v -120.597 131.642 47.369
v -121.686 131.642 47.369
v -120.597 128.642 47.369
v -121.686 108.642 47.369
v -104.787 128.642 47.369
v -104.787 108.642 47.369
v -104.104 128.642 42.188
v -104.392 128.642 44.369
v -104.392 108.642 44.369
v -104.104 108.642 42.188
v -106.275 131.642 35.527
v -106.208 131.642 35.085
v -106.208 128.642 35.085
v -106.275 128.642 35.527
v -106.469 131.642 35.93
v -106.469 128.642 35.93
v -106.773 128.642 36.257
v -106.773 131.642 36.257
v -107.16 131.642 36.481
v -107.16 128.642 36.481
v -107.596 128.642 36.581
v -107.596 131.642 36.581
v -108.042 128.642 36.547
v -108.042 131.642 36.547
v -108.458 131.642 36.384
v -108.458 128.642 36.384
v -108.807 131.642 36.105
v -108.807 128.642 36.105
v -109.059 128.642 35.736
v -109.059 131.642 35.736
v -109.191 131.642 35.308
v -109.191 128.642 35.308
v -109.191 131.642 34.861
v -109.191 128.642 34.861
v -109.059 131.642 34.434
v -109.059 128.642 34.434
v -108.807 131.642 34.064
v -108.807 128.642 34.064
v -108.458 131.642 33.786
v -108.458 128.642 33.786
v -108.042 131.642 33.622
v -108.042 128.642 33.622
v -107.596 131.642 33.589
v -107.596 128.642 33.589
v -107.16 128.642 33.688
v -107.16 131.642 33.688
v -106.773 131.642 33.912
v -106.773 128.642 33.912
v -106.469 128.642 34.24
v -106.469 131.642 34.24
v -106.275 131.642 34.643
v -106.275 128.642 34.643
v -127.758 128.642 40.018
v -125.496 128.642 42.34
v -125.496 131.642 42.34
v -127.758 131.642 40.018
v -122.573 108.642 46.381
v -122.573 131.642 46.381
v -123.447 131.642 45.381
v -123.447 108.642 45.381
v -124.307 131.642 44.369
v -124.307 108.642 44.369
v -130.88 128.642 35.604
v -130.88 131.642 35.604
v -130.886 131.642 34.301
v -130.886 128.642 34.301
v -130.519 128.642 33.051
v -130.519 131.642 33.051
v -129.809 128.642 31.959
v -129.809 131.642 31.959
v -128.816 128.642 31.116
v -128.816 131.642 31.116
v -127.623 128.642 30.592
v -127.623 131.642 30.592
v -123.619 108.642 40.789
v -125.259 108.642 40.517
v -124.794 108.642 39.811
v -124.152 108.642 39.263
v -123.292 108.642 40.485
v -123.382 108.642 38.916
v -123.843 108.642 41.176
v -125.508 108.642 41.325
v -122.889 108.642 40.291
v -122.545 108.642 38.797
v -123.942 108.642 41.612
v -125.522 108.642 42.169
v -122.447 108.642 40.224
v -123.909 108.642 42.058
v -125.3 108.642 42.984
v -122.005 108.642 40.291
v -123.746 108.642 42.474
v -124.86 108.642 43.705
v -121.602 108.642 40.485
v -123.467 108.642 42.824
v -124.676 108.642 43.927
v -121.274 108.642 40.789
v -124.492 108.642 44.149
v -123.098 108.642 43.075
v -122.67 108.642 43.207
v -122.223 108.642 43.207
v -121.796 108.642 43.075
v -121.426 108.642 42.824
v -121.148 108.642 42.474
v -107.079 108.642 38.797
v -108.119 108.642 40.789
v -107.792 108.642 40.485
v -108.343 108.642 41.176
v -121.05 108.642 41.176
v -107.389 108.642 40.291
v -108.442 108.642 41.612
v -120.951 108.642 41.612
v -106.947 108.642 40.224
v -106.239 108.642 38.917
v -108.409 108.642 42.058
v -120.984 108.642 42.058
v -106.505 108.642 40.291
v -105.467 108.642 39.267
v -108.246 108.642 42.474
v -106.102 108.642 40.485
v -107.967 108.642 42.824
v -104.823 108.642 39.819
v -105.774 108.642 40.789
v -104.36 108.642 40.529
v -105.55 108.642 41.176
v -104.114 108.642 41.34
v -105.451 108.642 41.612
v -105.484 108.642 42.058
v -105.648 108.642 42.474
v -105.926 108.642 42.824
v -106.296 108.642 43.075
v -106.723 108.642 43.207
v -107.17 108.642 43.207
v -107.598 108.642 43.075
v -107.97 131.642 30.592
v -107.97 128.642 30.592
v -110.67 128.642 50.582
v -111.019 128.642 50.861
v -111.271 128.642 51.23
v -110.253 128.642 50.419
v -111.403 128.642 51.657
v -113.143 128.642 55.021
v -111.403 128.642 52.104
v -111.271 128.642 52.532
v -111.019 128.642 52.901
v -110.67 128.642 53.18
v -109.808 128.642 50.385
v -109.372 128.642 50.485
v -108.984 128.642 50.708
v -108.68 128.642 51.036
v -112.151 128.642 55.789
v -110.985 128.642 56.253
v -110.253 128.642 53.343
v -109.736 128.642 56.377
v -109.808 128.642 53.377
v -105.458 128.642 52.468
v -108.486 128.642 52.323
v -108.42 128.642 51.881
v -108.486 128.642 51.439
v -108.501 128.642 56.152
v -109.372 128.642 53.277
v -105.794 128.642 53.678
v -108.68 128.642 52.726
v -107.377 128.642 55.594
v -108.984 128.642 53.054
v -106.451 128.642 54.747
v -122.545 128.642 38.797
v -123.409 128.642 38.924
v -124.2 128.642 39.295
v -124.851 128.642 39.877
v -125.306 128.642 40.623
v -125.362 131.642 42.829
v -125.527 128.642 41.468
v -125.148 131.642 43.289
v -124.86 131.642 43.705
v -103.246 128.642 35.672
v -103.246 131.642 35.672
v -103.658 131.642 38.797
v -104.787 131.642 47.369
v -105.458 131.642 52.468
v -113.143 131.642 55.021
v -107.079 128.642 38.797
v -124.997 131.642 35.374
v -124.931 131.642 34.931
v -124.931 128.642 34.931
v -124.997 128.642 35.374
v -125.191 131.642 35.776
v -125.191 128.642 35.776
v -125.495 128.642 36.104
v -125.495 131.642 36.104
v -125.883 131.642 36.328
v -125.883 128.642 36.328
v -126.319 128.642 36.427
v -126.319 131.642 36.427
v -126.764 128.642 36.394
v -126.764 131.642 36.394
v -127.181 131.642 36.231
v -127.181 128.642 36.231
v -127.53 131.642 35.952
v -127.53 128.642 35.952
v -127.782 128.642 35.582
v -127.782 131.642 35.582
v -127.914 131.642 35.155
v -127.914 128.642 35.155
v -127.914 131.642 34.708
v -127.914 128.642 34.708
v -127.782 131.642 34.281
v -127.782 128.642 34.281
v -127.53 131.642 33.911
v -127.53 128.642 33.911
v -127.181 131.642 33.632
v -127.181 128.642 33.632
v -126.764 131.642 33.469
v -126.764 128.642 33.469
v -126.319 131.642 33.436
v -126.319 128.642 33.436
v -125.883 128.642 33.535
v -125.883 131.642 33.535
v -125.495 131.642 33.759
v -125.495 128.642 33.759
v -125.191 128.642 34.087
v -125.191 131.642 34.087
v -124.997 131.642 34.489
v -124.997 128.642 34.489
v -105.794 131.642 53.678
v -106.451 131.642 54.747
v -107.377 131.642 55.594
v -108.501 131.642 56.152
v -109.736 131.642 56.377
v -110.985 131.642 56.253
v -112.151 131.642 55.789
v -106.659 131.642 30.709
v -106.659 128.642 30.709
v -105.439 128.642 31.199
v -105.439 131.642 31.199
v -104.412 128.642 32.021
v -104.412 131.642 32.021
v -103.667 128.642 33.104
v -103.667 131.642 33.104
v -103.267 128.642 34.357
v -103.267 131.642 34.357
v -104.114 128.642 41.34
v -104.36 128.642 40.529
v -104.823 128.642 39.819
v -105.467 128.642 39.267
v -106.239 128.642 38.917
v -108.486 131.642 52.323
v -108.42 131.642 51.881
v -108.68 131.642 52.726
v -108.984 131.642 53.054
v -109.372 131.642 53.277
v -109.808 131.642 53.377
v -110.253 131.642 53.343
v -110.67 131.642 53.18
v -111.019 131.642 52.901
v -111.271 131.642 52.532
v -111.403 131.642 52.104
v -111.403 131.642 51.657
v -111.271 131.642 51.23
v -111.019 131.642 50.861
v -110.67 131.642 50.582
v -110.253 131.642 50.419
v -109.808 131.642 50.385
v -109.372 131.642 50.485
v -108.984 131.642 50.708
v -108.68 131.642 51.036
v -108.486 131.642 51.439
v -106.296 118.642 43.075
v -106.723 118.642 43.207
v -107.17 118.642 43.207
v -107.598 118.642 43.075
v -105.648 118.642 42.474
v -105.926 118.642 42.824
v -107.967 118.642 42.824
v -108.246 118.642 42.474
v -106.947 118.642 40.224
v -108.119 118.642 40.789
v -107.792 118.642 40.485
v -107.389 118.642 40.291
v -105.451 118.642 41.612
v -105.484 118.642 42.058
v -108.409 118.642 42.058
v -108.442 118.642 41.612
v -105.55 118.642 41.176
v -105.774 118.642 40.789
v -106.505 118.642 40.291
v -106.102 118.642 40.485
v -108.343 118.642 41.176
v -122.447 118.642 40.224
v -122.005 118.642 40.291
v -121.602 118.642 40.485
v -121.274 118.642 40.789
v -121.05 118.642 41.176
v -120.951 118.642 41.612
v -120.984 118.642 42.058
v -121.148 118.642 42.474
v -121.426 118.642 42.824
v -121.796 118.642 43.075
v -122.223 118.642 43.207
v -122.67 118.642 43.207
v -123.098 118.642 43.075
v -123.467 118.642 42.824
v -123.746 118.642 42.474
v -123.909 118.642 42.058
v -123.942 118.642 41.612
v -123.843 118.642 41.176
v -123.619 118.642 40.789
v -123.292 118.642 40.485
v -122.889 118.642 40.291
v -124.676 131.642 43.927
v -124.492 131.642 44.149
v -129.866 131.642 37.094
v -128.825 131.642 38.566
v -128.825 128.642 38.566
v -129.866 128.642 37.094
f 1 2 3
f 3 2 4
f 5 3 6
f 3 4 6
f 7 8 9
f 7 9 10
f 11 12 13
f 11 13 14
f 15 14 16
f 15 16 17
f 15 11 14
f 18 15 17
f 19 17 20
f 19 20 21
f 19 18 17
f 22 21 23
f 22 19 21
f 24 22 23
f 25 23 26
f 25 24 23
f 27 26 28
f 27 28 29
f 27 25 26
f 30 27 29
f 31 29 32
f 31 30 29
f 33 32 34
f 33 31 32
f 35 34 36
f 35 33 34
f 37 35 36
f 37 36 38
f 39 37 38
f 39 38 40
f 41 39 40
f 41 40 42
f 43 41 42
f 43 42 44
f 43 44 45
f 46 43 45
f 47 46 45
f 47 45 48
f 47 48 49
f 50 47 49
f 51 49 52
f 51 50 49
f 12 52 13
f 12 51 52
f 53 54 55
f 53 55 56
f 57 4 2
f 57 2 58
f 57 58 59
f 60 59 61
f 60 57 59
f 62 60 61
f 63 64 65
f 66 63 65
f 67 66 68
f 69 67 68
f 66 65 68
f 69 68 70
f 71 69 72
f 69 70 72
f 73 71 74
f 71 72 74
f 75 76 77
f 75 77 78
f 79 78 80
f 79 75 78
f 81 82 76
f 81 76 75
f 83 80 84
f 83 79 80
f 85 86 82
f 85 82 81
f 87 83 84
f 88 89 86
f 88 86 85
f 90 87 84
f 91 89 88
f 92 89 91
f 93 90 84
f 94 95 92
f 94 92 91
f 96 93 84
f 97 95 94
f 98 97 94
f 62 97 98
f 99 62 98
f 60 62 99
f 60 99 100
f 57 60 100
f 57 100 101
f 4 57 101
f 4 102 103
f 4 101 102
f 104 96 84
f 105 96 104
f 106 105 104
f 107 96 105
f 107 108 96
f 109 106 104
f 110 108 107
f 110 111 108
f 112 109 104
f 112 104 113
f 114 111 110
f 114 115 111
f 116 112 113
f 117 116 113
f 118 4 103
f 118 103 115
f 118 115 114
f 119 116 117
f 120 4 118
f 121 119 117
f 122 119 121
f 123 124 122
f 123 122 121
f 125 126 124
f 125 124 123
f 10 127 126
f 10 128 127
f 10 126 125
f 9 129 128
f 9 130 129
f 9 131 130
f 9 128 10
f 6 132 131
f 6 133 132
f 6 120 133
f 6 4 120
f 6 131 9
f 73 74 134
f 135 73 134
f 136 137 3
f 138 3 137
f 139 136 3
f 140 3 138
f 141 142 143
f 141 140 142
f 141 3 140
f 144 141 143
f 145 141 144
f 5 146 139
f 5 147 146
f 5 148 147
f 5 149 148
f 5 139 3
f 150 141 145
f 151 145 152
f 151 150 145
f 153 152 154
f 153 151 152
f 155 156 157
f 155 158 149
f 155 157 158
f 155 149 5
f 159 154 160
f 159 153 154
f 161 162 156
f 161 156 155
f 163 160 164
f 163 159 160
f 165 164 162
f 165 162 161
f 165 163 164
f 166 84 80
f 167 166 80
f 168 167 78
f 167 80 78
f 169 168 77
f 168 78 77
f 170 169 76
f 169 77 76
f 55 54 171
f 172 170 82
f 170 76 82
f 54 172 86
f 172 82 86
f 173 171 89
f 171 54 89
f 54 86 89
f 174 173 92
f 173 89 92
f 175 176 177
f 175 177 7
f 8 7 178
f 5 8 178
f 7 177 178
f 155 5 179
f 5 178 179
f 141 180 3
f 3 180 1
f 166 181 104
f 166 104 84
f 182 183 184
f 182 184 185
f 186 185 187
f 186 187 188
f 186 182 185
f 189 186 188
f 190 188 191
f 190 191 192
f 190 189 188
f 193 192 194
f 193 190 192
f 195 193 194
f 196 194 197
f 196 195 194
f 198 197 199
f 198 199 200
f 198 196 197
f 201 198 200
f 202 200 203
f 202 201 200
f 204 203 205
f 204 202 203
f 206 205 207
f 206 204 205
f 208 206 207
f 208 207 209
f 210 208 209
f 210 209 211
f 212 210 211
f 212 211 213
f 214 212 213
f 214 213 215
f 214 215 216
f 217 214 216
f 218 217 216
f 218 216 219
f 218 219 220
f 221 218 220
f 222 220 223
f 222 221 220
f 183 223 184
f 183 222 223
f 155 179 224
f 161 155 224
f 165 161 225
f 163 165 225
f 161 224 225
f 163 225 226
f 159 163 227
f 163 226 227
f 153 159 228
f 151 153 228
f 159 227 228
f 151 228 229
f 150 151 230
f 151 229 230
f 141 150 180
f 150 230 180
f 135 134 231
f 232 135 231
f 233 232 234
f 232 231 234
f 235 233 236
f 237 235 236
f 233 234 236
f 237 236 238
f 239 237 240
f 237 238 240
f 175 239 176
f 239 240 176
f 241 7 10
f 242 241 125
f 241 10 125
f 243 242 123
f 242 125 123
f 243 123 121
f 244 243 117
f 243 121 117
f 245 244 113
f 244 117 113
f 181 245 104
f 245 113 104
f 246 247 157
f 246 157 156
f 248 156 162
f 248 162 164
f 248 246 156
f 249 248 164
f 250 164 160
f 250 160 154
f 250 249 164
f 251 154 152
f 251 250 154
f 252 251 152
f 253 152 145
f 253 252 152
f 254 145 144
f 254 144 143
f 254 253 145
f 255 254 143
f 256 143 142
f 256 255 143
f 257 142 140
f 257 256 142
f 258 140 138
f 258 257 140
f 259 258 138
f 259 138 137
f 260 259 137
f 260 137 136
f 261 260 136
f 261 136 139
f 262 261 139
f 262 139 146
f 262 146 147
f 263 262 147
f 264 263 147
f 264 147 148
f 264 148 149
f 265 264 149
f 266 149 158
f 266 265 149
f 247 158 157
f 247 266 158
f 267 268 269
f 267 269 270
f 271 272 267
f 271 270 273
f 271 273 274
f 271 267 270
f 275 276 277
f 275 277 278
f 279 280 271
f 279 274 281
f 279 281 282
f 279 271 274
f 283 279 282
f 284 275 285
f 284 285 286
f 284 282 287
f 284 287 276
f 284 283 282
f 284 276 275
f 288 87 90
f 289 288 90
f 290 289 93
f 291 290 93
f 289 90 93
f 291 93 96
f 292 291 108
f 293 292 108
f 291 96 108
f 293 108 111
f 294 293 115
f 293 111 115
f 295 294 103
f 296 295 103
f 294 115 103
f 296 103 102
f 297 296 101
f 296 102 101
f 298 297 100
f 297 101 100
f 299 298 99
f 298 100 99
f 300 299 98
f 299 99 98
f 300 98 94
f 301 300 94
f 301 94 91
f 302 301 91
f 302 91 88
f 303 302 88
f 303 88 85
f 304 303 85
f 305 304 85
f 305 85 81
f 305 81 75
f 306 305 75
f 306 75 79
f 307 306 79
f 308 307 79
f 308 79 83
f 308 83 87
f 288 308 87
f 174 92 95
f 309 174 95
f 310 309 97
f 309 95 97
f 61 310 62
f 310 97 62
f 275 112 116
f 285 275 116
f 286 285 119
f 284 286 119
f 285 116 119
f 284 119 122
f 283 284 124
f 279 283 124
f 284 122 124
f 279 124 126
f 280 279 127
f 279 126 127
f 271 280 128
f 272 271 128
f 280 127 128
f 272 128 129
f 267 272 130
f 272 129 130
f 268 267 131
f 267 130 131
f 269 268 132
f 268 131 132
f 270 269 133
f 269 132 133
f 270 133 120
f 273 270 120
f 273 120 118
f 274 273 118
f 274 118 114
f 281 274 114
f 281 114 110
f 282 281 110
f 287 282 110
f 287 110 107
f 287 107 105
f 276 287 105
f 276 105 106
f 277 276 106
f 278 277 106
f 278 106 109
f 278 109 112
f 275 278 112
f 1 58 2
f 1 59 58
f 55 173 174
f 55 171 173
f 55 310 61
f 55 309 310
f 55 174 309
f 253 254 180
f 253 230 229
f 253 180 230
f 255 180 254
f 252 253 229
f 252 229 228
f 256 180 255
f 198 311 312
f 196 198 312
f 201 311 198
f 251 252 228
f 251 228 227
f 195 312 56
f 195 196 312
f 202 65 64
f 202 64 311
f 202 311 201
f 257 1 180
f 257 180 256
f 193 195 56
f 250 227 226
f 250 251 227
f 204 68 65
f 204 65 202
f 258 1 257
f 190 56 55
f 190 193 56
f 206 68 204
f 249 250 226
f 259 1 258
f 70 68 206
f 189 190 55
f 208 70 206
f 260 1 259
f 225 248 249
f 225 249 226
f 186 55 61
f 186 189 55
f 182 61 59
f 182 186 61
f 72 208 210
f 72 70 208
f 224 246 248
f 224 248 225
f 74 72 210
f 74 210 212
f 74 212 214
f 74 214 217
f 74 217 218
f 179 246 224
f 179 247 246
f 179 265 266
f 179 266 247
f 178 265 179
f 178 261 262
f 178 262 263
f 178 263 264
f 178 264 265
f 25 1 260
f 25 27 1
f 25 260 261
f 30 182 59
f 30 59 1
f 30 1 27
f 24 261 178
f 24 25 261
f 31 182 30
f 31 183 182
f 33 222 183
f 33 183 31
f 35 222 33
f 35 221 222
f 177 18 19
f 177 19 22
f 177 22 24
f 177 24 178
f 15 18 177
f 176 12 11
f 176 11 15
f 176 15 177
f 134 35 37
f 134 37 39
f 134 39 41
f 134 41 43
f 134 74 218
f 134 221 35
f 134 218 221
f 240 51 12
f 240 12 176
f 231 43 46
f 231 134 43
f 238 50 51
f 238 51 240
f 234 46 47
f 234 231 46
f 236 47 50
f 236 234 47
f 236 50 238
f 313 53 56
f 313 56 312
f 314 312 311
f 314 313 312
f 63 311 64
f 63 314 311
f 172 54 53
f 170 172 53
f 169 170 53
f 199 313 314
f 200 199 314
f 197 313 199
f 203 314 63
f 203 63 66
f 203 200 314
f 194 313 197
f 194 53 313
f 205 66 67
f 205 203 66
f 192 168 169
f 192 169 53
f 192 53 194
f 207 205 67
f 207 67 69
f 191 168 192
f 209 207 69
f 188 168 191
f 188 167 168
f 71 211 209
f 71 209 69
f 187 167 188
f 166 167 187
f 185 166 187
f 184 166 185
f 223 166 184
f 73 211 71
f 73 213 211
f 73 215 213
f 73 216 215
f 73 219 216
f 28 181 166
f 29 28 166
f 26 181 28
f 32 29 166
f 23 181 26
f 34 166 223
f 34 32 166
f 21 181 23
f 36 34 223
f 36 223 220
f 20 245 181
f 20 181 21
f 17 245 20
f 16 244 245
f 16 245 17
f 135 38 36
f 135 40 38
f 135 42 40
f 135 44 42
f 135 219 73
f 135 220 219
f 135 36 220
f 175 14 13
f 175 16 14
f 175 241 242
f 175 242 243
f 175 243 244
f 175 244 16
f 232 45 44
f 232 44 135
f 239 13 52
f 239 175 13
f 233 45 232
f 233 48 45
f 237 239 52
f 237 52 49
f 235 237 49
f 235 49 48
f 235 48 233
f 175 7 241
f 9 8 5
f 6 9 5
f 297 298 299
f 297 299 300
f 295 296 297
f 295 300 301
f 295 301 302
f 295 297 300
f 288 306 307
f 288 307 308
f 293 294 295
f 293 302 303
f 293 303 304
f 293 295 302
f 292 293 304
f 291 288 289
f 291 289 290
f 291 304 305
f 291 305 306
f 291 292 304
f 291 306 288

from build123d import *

# Parameters (mm, degrees)
EXTRUDE_1_OUTLINE_R = 1.5
EXTRUDE_1_DEPTH     = 3
EXTRUDE_2_DEPTH     = 25
EXTRUDE_3_DEPTH     = 3
EXTRUDE_4_REACH     = 147.278
FILLET_1_R          = 3
SKETCH_5_R          = 1.5
CUT_EXTRUDE_3_DEPTH = 15
SKETCH_6_R          = 126.976740186
SKETCH_6_R_2        = 100
CUT_EXTRUDE_4_DEPTH = 30
SKETCH_8_W          = 28.33895888
SKETCH_8_H          = 14.242713356
CUT_EXTRUDE_5_DEPTH = 5


# Read off the part's stored shape, not the designer's step: 填料-伸長1
with BuildPart() as part:
    # 填料-伸長1 outline → 填料-伸長1 (new body)
    with BuildSketch(Plane.XZ.offset(-131.641882403)):
        with BuildLine():
            ThreePointArc((-105.458191259, 52.468420543), (-108.501205852, 56.151510861), (-113.143070085, 55.020940854))
            Line((-113.143070085, 55.020940854), (-129.654103506, 38.071506203))
            ThreePointArc((-129.654103506, 38.071506203), (-130.77342938, 33.752171981), (-127.62304878, 30.592323786))
            Line((-127.62304878, 30.592323786), (-107.96955265, 30.592323786))
            ThreePointArc((-107.96955265, 30.592323786), (-104.412306977, 32.020558846), (-103.246421534, 35.67221098))
            Line((-103.246421534, 35.67221098), (-105.458191259, 52.468420543))
        make_face()
        with Locations((-126.430709133, 34.931485706)):
            Circle(EXTRUDE_1_OUTLINE_R, mode=Mode.SUBTRACT)
        with Locations((-107.707905988, 35.084710794)):
            Circle(EXTRUDE_1_OUTLINE_R, mode=Mode.SUBTRACT)
        with Locations((-109.919675712, 51.880920357)):
            Circle(EXTRUDE_1_OUTLINE_R, mode=Mode.SUBTRACT)
    extrude(amount=EXTRUDE_1_DEPTH)

    # 草圖2 → 填料-伸長2 (add)
    with BuildSketch(Plane.XZ.offset(-128.641882403)):
        Polygon((-104.786745972, 47.369455849), (-124.786745972, 47.369455849), (-124.786745972, 44.369455849), (-104.786745972, 44.369455849), (-104.391697962, 44.369455849), align=None)
    extrude(amount=EXTRUDE_2_DEPTH)

    # 草圖3 → 填料-伸長3 (add)
    with BuildSketch(Plane(origin=(0, 128.641882403, 0), x_dir=(1, 0, 0), z_dir=(0, 1, 0))):
        Polygon((-124.786745972, -47.369455849), (-120.596647578, -47.369455849), (-123.519051852, -44.369455849), (-124.786745972, -44.369455849), align=None)
    extrude(amount=EXTRUDE_3_DEPTH)

    # 填料-伸長4: up to this face of the body (flat: up to its plane)
    extrude_4_end = Plane(part.part.faces().sort_by_distance((-115.187288505, 131.641882403, 40.896845269))[0])
    # 草圖4 → 填料-伸長4 (add, up to the picked face)
    with BuildSketch(Plane.XZ.offset(-103.641882403), mode=Mode.PRIVATE) as extrude_4_sk1:
        with BuildLine():
            Line((-104.786745972, 47.369455849), (-103.657869092, 38.796749367))
            Line((-103.657869092, 38.796749367), (-128.657869092, 38.796749367))
            ThreePointArc((-128.657869092, 38.796749367), (-125.290449125, 43.179472861), (-121.686031693, 47.369455849))
            Line((-121.686031693, 47.369455849), (-104.786745972, 47.369455849))
        make_face()
    extrude_4_tool1 = split(extrude(extrude_4_sk1.sketch, amount=-EXTRUDE_4_REACH, mode=Mode.PRIVATE), bisect_by=extrude_4_end, keep=Keep.BOTH, mode=Mode.PRIVATE)
    add(extrude_4_tool1.solids().sort_by(Axis((-114.856202, 103.641882, 42.808825), (0, 1, 0)))[0])

    # 圓角1
    # the kernel refuses this fillet: 3 mm, written as the material it takes off along each edge
    with BuildSketch(Plane(origin=(-128.657869092, 88.125757689, 38.796749367), x_dir=(1, 0, 0), z_dir=(0, 1, 0))) as fillet_1_piece_1:
        with BuildLine():
            CenterArc((6.112644238, -3), FILLET_1_R, 90, 129.509532044)
            ThreePointArc((3.798087984, -4.90861975), (1.860953441, -2.483782776), (0, 0))
            Line((0, 0), (6.112644238, 0))
        make_face()
    extrude(amount=40.516124714, mode=Mode.SUBTRACT)
    with BuildSketch(Plane(origin=(-128.657869092, 88.125757689, 38.796749367), x_dir=(1, 0, 0), z_dir=(0, 1, 0))) as fillet_1_piece_2_section:
        with BuildLine():
            CenterArc((6.112644238, -3), FILLET_1_R, 90, 129.509532044)
            ThreePointArc((3.798087984, -4.90861975), (1.860953441, -2.483782776), (0, 0))
            Line((0, 0), (6.112644238, 0))
        make_face()
    fillet_1_piece_2 = extrude(amount=56.032249428, mode=Mode.PRIVATE)
    fillet_1_piece_2 = split(fillet_1_piece_2, bisect_by=Plane(origin=(-126.052723455, 130.141882403, 41.768510156), z_dir=(-0.7163098605374205, 0, 0.6977823326058501)), keep=Keep.TOP, mode=Mode.PRIVATE)
    add(fillet_1_piece_2, mode=Mode.SUBTRACT)
    with BuildSketch(Plane(origin=(-103.657869092, 95.089515631, 38.796749367), x_dir=(-0.13055559688671156, 0, 0.9914409897323968), z_dir=(0, 1, 0))) as fillet_1_piece_3:
        with BuildLine():
            CenterArc((FILLET_1_R * 1.14031556955, -FILLET_1_R), FILLET_1_R, 90, 97.501699304)
            Line((FILLET_1_R * 0.148874579822, -FILLET_1_R * 1.13055559689), (0, 0))
            Line((0, 0), (FILLET_1_R * 1.14031556955, 0))
        make_face()
    extrude(amount=33.552366772, mode=Mode.SUBTRACT)

    # 草圖5 → 除料-伸長3 (cut)
    with BuildSketch(Plane.XZ.offset(-103.641882403)):
        with Locations(Location((-106.94667544, 41.72393279, 0), (0, 0, 270))):
            Circle(SKETCH_5_R)
        with Locations(Location((-122.44667544, 41.72393279, 0), (0, 0, 270))):
            Circle(SKETCH_5_R)
    extrude(amount=-CUT_EXTRUDE_3_DEPTH, mode=Mode.SUBTRACT)

    # 草圖6 → 除料-伸長4 (cut)
    with BuildSketch(Plane.XZ.offset(-103.641882403)):
        with Locations((-47.707905988, -19.915289206)):
            Circle(SKETCH_6_R)
        with Locations((-47.707905988, -19.915289206)):
            Circle(SKETCH_6_R_2, mode=Mode.SUBTRACT)
    extrude(amount=-CUT_EXTRUDE_4_DEPTH, mode=Mode.SUBTRACT)

    # 草圖8 → 除料-伸長5 (cut)
    with BuildSketch(Plane.XZ.offset(-103.641882403)):
        with Locations((-114.972608674, 43.454782353)):
            Rectangle(SKETCH_8_W, SKETCH_8_H)
    extrude(amount=-CUT_EXTRUDE_5_DEPTH, mode=Mode.SUBTRACT)


solid = part.part
